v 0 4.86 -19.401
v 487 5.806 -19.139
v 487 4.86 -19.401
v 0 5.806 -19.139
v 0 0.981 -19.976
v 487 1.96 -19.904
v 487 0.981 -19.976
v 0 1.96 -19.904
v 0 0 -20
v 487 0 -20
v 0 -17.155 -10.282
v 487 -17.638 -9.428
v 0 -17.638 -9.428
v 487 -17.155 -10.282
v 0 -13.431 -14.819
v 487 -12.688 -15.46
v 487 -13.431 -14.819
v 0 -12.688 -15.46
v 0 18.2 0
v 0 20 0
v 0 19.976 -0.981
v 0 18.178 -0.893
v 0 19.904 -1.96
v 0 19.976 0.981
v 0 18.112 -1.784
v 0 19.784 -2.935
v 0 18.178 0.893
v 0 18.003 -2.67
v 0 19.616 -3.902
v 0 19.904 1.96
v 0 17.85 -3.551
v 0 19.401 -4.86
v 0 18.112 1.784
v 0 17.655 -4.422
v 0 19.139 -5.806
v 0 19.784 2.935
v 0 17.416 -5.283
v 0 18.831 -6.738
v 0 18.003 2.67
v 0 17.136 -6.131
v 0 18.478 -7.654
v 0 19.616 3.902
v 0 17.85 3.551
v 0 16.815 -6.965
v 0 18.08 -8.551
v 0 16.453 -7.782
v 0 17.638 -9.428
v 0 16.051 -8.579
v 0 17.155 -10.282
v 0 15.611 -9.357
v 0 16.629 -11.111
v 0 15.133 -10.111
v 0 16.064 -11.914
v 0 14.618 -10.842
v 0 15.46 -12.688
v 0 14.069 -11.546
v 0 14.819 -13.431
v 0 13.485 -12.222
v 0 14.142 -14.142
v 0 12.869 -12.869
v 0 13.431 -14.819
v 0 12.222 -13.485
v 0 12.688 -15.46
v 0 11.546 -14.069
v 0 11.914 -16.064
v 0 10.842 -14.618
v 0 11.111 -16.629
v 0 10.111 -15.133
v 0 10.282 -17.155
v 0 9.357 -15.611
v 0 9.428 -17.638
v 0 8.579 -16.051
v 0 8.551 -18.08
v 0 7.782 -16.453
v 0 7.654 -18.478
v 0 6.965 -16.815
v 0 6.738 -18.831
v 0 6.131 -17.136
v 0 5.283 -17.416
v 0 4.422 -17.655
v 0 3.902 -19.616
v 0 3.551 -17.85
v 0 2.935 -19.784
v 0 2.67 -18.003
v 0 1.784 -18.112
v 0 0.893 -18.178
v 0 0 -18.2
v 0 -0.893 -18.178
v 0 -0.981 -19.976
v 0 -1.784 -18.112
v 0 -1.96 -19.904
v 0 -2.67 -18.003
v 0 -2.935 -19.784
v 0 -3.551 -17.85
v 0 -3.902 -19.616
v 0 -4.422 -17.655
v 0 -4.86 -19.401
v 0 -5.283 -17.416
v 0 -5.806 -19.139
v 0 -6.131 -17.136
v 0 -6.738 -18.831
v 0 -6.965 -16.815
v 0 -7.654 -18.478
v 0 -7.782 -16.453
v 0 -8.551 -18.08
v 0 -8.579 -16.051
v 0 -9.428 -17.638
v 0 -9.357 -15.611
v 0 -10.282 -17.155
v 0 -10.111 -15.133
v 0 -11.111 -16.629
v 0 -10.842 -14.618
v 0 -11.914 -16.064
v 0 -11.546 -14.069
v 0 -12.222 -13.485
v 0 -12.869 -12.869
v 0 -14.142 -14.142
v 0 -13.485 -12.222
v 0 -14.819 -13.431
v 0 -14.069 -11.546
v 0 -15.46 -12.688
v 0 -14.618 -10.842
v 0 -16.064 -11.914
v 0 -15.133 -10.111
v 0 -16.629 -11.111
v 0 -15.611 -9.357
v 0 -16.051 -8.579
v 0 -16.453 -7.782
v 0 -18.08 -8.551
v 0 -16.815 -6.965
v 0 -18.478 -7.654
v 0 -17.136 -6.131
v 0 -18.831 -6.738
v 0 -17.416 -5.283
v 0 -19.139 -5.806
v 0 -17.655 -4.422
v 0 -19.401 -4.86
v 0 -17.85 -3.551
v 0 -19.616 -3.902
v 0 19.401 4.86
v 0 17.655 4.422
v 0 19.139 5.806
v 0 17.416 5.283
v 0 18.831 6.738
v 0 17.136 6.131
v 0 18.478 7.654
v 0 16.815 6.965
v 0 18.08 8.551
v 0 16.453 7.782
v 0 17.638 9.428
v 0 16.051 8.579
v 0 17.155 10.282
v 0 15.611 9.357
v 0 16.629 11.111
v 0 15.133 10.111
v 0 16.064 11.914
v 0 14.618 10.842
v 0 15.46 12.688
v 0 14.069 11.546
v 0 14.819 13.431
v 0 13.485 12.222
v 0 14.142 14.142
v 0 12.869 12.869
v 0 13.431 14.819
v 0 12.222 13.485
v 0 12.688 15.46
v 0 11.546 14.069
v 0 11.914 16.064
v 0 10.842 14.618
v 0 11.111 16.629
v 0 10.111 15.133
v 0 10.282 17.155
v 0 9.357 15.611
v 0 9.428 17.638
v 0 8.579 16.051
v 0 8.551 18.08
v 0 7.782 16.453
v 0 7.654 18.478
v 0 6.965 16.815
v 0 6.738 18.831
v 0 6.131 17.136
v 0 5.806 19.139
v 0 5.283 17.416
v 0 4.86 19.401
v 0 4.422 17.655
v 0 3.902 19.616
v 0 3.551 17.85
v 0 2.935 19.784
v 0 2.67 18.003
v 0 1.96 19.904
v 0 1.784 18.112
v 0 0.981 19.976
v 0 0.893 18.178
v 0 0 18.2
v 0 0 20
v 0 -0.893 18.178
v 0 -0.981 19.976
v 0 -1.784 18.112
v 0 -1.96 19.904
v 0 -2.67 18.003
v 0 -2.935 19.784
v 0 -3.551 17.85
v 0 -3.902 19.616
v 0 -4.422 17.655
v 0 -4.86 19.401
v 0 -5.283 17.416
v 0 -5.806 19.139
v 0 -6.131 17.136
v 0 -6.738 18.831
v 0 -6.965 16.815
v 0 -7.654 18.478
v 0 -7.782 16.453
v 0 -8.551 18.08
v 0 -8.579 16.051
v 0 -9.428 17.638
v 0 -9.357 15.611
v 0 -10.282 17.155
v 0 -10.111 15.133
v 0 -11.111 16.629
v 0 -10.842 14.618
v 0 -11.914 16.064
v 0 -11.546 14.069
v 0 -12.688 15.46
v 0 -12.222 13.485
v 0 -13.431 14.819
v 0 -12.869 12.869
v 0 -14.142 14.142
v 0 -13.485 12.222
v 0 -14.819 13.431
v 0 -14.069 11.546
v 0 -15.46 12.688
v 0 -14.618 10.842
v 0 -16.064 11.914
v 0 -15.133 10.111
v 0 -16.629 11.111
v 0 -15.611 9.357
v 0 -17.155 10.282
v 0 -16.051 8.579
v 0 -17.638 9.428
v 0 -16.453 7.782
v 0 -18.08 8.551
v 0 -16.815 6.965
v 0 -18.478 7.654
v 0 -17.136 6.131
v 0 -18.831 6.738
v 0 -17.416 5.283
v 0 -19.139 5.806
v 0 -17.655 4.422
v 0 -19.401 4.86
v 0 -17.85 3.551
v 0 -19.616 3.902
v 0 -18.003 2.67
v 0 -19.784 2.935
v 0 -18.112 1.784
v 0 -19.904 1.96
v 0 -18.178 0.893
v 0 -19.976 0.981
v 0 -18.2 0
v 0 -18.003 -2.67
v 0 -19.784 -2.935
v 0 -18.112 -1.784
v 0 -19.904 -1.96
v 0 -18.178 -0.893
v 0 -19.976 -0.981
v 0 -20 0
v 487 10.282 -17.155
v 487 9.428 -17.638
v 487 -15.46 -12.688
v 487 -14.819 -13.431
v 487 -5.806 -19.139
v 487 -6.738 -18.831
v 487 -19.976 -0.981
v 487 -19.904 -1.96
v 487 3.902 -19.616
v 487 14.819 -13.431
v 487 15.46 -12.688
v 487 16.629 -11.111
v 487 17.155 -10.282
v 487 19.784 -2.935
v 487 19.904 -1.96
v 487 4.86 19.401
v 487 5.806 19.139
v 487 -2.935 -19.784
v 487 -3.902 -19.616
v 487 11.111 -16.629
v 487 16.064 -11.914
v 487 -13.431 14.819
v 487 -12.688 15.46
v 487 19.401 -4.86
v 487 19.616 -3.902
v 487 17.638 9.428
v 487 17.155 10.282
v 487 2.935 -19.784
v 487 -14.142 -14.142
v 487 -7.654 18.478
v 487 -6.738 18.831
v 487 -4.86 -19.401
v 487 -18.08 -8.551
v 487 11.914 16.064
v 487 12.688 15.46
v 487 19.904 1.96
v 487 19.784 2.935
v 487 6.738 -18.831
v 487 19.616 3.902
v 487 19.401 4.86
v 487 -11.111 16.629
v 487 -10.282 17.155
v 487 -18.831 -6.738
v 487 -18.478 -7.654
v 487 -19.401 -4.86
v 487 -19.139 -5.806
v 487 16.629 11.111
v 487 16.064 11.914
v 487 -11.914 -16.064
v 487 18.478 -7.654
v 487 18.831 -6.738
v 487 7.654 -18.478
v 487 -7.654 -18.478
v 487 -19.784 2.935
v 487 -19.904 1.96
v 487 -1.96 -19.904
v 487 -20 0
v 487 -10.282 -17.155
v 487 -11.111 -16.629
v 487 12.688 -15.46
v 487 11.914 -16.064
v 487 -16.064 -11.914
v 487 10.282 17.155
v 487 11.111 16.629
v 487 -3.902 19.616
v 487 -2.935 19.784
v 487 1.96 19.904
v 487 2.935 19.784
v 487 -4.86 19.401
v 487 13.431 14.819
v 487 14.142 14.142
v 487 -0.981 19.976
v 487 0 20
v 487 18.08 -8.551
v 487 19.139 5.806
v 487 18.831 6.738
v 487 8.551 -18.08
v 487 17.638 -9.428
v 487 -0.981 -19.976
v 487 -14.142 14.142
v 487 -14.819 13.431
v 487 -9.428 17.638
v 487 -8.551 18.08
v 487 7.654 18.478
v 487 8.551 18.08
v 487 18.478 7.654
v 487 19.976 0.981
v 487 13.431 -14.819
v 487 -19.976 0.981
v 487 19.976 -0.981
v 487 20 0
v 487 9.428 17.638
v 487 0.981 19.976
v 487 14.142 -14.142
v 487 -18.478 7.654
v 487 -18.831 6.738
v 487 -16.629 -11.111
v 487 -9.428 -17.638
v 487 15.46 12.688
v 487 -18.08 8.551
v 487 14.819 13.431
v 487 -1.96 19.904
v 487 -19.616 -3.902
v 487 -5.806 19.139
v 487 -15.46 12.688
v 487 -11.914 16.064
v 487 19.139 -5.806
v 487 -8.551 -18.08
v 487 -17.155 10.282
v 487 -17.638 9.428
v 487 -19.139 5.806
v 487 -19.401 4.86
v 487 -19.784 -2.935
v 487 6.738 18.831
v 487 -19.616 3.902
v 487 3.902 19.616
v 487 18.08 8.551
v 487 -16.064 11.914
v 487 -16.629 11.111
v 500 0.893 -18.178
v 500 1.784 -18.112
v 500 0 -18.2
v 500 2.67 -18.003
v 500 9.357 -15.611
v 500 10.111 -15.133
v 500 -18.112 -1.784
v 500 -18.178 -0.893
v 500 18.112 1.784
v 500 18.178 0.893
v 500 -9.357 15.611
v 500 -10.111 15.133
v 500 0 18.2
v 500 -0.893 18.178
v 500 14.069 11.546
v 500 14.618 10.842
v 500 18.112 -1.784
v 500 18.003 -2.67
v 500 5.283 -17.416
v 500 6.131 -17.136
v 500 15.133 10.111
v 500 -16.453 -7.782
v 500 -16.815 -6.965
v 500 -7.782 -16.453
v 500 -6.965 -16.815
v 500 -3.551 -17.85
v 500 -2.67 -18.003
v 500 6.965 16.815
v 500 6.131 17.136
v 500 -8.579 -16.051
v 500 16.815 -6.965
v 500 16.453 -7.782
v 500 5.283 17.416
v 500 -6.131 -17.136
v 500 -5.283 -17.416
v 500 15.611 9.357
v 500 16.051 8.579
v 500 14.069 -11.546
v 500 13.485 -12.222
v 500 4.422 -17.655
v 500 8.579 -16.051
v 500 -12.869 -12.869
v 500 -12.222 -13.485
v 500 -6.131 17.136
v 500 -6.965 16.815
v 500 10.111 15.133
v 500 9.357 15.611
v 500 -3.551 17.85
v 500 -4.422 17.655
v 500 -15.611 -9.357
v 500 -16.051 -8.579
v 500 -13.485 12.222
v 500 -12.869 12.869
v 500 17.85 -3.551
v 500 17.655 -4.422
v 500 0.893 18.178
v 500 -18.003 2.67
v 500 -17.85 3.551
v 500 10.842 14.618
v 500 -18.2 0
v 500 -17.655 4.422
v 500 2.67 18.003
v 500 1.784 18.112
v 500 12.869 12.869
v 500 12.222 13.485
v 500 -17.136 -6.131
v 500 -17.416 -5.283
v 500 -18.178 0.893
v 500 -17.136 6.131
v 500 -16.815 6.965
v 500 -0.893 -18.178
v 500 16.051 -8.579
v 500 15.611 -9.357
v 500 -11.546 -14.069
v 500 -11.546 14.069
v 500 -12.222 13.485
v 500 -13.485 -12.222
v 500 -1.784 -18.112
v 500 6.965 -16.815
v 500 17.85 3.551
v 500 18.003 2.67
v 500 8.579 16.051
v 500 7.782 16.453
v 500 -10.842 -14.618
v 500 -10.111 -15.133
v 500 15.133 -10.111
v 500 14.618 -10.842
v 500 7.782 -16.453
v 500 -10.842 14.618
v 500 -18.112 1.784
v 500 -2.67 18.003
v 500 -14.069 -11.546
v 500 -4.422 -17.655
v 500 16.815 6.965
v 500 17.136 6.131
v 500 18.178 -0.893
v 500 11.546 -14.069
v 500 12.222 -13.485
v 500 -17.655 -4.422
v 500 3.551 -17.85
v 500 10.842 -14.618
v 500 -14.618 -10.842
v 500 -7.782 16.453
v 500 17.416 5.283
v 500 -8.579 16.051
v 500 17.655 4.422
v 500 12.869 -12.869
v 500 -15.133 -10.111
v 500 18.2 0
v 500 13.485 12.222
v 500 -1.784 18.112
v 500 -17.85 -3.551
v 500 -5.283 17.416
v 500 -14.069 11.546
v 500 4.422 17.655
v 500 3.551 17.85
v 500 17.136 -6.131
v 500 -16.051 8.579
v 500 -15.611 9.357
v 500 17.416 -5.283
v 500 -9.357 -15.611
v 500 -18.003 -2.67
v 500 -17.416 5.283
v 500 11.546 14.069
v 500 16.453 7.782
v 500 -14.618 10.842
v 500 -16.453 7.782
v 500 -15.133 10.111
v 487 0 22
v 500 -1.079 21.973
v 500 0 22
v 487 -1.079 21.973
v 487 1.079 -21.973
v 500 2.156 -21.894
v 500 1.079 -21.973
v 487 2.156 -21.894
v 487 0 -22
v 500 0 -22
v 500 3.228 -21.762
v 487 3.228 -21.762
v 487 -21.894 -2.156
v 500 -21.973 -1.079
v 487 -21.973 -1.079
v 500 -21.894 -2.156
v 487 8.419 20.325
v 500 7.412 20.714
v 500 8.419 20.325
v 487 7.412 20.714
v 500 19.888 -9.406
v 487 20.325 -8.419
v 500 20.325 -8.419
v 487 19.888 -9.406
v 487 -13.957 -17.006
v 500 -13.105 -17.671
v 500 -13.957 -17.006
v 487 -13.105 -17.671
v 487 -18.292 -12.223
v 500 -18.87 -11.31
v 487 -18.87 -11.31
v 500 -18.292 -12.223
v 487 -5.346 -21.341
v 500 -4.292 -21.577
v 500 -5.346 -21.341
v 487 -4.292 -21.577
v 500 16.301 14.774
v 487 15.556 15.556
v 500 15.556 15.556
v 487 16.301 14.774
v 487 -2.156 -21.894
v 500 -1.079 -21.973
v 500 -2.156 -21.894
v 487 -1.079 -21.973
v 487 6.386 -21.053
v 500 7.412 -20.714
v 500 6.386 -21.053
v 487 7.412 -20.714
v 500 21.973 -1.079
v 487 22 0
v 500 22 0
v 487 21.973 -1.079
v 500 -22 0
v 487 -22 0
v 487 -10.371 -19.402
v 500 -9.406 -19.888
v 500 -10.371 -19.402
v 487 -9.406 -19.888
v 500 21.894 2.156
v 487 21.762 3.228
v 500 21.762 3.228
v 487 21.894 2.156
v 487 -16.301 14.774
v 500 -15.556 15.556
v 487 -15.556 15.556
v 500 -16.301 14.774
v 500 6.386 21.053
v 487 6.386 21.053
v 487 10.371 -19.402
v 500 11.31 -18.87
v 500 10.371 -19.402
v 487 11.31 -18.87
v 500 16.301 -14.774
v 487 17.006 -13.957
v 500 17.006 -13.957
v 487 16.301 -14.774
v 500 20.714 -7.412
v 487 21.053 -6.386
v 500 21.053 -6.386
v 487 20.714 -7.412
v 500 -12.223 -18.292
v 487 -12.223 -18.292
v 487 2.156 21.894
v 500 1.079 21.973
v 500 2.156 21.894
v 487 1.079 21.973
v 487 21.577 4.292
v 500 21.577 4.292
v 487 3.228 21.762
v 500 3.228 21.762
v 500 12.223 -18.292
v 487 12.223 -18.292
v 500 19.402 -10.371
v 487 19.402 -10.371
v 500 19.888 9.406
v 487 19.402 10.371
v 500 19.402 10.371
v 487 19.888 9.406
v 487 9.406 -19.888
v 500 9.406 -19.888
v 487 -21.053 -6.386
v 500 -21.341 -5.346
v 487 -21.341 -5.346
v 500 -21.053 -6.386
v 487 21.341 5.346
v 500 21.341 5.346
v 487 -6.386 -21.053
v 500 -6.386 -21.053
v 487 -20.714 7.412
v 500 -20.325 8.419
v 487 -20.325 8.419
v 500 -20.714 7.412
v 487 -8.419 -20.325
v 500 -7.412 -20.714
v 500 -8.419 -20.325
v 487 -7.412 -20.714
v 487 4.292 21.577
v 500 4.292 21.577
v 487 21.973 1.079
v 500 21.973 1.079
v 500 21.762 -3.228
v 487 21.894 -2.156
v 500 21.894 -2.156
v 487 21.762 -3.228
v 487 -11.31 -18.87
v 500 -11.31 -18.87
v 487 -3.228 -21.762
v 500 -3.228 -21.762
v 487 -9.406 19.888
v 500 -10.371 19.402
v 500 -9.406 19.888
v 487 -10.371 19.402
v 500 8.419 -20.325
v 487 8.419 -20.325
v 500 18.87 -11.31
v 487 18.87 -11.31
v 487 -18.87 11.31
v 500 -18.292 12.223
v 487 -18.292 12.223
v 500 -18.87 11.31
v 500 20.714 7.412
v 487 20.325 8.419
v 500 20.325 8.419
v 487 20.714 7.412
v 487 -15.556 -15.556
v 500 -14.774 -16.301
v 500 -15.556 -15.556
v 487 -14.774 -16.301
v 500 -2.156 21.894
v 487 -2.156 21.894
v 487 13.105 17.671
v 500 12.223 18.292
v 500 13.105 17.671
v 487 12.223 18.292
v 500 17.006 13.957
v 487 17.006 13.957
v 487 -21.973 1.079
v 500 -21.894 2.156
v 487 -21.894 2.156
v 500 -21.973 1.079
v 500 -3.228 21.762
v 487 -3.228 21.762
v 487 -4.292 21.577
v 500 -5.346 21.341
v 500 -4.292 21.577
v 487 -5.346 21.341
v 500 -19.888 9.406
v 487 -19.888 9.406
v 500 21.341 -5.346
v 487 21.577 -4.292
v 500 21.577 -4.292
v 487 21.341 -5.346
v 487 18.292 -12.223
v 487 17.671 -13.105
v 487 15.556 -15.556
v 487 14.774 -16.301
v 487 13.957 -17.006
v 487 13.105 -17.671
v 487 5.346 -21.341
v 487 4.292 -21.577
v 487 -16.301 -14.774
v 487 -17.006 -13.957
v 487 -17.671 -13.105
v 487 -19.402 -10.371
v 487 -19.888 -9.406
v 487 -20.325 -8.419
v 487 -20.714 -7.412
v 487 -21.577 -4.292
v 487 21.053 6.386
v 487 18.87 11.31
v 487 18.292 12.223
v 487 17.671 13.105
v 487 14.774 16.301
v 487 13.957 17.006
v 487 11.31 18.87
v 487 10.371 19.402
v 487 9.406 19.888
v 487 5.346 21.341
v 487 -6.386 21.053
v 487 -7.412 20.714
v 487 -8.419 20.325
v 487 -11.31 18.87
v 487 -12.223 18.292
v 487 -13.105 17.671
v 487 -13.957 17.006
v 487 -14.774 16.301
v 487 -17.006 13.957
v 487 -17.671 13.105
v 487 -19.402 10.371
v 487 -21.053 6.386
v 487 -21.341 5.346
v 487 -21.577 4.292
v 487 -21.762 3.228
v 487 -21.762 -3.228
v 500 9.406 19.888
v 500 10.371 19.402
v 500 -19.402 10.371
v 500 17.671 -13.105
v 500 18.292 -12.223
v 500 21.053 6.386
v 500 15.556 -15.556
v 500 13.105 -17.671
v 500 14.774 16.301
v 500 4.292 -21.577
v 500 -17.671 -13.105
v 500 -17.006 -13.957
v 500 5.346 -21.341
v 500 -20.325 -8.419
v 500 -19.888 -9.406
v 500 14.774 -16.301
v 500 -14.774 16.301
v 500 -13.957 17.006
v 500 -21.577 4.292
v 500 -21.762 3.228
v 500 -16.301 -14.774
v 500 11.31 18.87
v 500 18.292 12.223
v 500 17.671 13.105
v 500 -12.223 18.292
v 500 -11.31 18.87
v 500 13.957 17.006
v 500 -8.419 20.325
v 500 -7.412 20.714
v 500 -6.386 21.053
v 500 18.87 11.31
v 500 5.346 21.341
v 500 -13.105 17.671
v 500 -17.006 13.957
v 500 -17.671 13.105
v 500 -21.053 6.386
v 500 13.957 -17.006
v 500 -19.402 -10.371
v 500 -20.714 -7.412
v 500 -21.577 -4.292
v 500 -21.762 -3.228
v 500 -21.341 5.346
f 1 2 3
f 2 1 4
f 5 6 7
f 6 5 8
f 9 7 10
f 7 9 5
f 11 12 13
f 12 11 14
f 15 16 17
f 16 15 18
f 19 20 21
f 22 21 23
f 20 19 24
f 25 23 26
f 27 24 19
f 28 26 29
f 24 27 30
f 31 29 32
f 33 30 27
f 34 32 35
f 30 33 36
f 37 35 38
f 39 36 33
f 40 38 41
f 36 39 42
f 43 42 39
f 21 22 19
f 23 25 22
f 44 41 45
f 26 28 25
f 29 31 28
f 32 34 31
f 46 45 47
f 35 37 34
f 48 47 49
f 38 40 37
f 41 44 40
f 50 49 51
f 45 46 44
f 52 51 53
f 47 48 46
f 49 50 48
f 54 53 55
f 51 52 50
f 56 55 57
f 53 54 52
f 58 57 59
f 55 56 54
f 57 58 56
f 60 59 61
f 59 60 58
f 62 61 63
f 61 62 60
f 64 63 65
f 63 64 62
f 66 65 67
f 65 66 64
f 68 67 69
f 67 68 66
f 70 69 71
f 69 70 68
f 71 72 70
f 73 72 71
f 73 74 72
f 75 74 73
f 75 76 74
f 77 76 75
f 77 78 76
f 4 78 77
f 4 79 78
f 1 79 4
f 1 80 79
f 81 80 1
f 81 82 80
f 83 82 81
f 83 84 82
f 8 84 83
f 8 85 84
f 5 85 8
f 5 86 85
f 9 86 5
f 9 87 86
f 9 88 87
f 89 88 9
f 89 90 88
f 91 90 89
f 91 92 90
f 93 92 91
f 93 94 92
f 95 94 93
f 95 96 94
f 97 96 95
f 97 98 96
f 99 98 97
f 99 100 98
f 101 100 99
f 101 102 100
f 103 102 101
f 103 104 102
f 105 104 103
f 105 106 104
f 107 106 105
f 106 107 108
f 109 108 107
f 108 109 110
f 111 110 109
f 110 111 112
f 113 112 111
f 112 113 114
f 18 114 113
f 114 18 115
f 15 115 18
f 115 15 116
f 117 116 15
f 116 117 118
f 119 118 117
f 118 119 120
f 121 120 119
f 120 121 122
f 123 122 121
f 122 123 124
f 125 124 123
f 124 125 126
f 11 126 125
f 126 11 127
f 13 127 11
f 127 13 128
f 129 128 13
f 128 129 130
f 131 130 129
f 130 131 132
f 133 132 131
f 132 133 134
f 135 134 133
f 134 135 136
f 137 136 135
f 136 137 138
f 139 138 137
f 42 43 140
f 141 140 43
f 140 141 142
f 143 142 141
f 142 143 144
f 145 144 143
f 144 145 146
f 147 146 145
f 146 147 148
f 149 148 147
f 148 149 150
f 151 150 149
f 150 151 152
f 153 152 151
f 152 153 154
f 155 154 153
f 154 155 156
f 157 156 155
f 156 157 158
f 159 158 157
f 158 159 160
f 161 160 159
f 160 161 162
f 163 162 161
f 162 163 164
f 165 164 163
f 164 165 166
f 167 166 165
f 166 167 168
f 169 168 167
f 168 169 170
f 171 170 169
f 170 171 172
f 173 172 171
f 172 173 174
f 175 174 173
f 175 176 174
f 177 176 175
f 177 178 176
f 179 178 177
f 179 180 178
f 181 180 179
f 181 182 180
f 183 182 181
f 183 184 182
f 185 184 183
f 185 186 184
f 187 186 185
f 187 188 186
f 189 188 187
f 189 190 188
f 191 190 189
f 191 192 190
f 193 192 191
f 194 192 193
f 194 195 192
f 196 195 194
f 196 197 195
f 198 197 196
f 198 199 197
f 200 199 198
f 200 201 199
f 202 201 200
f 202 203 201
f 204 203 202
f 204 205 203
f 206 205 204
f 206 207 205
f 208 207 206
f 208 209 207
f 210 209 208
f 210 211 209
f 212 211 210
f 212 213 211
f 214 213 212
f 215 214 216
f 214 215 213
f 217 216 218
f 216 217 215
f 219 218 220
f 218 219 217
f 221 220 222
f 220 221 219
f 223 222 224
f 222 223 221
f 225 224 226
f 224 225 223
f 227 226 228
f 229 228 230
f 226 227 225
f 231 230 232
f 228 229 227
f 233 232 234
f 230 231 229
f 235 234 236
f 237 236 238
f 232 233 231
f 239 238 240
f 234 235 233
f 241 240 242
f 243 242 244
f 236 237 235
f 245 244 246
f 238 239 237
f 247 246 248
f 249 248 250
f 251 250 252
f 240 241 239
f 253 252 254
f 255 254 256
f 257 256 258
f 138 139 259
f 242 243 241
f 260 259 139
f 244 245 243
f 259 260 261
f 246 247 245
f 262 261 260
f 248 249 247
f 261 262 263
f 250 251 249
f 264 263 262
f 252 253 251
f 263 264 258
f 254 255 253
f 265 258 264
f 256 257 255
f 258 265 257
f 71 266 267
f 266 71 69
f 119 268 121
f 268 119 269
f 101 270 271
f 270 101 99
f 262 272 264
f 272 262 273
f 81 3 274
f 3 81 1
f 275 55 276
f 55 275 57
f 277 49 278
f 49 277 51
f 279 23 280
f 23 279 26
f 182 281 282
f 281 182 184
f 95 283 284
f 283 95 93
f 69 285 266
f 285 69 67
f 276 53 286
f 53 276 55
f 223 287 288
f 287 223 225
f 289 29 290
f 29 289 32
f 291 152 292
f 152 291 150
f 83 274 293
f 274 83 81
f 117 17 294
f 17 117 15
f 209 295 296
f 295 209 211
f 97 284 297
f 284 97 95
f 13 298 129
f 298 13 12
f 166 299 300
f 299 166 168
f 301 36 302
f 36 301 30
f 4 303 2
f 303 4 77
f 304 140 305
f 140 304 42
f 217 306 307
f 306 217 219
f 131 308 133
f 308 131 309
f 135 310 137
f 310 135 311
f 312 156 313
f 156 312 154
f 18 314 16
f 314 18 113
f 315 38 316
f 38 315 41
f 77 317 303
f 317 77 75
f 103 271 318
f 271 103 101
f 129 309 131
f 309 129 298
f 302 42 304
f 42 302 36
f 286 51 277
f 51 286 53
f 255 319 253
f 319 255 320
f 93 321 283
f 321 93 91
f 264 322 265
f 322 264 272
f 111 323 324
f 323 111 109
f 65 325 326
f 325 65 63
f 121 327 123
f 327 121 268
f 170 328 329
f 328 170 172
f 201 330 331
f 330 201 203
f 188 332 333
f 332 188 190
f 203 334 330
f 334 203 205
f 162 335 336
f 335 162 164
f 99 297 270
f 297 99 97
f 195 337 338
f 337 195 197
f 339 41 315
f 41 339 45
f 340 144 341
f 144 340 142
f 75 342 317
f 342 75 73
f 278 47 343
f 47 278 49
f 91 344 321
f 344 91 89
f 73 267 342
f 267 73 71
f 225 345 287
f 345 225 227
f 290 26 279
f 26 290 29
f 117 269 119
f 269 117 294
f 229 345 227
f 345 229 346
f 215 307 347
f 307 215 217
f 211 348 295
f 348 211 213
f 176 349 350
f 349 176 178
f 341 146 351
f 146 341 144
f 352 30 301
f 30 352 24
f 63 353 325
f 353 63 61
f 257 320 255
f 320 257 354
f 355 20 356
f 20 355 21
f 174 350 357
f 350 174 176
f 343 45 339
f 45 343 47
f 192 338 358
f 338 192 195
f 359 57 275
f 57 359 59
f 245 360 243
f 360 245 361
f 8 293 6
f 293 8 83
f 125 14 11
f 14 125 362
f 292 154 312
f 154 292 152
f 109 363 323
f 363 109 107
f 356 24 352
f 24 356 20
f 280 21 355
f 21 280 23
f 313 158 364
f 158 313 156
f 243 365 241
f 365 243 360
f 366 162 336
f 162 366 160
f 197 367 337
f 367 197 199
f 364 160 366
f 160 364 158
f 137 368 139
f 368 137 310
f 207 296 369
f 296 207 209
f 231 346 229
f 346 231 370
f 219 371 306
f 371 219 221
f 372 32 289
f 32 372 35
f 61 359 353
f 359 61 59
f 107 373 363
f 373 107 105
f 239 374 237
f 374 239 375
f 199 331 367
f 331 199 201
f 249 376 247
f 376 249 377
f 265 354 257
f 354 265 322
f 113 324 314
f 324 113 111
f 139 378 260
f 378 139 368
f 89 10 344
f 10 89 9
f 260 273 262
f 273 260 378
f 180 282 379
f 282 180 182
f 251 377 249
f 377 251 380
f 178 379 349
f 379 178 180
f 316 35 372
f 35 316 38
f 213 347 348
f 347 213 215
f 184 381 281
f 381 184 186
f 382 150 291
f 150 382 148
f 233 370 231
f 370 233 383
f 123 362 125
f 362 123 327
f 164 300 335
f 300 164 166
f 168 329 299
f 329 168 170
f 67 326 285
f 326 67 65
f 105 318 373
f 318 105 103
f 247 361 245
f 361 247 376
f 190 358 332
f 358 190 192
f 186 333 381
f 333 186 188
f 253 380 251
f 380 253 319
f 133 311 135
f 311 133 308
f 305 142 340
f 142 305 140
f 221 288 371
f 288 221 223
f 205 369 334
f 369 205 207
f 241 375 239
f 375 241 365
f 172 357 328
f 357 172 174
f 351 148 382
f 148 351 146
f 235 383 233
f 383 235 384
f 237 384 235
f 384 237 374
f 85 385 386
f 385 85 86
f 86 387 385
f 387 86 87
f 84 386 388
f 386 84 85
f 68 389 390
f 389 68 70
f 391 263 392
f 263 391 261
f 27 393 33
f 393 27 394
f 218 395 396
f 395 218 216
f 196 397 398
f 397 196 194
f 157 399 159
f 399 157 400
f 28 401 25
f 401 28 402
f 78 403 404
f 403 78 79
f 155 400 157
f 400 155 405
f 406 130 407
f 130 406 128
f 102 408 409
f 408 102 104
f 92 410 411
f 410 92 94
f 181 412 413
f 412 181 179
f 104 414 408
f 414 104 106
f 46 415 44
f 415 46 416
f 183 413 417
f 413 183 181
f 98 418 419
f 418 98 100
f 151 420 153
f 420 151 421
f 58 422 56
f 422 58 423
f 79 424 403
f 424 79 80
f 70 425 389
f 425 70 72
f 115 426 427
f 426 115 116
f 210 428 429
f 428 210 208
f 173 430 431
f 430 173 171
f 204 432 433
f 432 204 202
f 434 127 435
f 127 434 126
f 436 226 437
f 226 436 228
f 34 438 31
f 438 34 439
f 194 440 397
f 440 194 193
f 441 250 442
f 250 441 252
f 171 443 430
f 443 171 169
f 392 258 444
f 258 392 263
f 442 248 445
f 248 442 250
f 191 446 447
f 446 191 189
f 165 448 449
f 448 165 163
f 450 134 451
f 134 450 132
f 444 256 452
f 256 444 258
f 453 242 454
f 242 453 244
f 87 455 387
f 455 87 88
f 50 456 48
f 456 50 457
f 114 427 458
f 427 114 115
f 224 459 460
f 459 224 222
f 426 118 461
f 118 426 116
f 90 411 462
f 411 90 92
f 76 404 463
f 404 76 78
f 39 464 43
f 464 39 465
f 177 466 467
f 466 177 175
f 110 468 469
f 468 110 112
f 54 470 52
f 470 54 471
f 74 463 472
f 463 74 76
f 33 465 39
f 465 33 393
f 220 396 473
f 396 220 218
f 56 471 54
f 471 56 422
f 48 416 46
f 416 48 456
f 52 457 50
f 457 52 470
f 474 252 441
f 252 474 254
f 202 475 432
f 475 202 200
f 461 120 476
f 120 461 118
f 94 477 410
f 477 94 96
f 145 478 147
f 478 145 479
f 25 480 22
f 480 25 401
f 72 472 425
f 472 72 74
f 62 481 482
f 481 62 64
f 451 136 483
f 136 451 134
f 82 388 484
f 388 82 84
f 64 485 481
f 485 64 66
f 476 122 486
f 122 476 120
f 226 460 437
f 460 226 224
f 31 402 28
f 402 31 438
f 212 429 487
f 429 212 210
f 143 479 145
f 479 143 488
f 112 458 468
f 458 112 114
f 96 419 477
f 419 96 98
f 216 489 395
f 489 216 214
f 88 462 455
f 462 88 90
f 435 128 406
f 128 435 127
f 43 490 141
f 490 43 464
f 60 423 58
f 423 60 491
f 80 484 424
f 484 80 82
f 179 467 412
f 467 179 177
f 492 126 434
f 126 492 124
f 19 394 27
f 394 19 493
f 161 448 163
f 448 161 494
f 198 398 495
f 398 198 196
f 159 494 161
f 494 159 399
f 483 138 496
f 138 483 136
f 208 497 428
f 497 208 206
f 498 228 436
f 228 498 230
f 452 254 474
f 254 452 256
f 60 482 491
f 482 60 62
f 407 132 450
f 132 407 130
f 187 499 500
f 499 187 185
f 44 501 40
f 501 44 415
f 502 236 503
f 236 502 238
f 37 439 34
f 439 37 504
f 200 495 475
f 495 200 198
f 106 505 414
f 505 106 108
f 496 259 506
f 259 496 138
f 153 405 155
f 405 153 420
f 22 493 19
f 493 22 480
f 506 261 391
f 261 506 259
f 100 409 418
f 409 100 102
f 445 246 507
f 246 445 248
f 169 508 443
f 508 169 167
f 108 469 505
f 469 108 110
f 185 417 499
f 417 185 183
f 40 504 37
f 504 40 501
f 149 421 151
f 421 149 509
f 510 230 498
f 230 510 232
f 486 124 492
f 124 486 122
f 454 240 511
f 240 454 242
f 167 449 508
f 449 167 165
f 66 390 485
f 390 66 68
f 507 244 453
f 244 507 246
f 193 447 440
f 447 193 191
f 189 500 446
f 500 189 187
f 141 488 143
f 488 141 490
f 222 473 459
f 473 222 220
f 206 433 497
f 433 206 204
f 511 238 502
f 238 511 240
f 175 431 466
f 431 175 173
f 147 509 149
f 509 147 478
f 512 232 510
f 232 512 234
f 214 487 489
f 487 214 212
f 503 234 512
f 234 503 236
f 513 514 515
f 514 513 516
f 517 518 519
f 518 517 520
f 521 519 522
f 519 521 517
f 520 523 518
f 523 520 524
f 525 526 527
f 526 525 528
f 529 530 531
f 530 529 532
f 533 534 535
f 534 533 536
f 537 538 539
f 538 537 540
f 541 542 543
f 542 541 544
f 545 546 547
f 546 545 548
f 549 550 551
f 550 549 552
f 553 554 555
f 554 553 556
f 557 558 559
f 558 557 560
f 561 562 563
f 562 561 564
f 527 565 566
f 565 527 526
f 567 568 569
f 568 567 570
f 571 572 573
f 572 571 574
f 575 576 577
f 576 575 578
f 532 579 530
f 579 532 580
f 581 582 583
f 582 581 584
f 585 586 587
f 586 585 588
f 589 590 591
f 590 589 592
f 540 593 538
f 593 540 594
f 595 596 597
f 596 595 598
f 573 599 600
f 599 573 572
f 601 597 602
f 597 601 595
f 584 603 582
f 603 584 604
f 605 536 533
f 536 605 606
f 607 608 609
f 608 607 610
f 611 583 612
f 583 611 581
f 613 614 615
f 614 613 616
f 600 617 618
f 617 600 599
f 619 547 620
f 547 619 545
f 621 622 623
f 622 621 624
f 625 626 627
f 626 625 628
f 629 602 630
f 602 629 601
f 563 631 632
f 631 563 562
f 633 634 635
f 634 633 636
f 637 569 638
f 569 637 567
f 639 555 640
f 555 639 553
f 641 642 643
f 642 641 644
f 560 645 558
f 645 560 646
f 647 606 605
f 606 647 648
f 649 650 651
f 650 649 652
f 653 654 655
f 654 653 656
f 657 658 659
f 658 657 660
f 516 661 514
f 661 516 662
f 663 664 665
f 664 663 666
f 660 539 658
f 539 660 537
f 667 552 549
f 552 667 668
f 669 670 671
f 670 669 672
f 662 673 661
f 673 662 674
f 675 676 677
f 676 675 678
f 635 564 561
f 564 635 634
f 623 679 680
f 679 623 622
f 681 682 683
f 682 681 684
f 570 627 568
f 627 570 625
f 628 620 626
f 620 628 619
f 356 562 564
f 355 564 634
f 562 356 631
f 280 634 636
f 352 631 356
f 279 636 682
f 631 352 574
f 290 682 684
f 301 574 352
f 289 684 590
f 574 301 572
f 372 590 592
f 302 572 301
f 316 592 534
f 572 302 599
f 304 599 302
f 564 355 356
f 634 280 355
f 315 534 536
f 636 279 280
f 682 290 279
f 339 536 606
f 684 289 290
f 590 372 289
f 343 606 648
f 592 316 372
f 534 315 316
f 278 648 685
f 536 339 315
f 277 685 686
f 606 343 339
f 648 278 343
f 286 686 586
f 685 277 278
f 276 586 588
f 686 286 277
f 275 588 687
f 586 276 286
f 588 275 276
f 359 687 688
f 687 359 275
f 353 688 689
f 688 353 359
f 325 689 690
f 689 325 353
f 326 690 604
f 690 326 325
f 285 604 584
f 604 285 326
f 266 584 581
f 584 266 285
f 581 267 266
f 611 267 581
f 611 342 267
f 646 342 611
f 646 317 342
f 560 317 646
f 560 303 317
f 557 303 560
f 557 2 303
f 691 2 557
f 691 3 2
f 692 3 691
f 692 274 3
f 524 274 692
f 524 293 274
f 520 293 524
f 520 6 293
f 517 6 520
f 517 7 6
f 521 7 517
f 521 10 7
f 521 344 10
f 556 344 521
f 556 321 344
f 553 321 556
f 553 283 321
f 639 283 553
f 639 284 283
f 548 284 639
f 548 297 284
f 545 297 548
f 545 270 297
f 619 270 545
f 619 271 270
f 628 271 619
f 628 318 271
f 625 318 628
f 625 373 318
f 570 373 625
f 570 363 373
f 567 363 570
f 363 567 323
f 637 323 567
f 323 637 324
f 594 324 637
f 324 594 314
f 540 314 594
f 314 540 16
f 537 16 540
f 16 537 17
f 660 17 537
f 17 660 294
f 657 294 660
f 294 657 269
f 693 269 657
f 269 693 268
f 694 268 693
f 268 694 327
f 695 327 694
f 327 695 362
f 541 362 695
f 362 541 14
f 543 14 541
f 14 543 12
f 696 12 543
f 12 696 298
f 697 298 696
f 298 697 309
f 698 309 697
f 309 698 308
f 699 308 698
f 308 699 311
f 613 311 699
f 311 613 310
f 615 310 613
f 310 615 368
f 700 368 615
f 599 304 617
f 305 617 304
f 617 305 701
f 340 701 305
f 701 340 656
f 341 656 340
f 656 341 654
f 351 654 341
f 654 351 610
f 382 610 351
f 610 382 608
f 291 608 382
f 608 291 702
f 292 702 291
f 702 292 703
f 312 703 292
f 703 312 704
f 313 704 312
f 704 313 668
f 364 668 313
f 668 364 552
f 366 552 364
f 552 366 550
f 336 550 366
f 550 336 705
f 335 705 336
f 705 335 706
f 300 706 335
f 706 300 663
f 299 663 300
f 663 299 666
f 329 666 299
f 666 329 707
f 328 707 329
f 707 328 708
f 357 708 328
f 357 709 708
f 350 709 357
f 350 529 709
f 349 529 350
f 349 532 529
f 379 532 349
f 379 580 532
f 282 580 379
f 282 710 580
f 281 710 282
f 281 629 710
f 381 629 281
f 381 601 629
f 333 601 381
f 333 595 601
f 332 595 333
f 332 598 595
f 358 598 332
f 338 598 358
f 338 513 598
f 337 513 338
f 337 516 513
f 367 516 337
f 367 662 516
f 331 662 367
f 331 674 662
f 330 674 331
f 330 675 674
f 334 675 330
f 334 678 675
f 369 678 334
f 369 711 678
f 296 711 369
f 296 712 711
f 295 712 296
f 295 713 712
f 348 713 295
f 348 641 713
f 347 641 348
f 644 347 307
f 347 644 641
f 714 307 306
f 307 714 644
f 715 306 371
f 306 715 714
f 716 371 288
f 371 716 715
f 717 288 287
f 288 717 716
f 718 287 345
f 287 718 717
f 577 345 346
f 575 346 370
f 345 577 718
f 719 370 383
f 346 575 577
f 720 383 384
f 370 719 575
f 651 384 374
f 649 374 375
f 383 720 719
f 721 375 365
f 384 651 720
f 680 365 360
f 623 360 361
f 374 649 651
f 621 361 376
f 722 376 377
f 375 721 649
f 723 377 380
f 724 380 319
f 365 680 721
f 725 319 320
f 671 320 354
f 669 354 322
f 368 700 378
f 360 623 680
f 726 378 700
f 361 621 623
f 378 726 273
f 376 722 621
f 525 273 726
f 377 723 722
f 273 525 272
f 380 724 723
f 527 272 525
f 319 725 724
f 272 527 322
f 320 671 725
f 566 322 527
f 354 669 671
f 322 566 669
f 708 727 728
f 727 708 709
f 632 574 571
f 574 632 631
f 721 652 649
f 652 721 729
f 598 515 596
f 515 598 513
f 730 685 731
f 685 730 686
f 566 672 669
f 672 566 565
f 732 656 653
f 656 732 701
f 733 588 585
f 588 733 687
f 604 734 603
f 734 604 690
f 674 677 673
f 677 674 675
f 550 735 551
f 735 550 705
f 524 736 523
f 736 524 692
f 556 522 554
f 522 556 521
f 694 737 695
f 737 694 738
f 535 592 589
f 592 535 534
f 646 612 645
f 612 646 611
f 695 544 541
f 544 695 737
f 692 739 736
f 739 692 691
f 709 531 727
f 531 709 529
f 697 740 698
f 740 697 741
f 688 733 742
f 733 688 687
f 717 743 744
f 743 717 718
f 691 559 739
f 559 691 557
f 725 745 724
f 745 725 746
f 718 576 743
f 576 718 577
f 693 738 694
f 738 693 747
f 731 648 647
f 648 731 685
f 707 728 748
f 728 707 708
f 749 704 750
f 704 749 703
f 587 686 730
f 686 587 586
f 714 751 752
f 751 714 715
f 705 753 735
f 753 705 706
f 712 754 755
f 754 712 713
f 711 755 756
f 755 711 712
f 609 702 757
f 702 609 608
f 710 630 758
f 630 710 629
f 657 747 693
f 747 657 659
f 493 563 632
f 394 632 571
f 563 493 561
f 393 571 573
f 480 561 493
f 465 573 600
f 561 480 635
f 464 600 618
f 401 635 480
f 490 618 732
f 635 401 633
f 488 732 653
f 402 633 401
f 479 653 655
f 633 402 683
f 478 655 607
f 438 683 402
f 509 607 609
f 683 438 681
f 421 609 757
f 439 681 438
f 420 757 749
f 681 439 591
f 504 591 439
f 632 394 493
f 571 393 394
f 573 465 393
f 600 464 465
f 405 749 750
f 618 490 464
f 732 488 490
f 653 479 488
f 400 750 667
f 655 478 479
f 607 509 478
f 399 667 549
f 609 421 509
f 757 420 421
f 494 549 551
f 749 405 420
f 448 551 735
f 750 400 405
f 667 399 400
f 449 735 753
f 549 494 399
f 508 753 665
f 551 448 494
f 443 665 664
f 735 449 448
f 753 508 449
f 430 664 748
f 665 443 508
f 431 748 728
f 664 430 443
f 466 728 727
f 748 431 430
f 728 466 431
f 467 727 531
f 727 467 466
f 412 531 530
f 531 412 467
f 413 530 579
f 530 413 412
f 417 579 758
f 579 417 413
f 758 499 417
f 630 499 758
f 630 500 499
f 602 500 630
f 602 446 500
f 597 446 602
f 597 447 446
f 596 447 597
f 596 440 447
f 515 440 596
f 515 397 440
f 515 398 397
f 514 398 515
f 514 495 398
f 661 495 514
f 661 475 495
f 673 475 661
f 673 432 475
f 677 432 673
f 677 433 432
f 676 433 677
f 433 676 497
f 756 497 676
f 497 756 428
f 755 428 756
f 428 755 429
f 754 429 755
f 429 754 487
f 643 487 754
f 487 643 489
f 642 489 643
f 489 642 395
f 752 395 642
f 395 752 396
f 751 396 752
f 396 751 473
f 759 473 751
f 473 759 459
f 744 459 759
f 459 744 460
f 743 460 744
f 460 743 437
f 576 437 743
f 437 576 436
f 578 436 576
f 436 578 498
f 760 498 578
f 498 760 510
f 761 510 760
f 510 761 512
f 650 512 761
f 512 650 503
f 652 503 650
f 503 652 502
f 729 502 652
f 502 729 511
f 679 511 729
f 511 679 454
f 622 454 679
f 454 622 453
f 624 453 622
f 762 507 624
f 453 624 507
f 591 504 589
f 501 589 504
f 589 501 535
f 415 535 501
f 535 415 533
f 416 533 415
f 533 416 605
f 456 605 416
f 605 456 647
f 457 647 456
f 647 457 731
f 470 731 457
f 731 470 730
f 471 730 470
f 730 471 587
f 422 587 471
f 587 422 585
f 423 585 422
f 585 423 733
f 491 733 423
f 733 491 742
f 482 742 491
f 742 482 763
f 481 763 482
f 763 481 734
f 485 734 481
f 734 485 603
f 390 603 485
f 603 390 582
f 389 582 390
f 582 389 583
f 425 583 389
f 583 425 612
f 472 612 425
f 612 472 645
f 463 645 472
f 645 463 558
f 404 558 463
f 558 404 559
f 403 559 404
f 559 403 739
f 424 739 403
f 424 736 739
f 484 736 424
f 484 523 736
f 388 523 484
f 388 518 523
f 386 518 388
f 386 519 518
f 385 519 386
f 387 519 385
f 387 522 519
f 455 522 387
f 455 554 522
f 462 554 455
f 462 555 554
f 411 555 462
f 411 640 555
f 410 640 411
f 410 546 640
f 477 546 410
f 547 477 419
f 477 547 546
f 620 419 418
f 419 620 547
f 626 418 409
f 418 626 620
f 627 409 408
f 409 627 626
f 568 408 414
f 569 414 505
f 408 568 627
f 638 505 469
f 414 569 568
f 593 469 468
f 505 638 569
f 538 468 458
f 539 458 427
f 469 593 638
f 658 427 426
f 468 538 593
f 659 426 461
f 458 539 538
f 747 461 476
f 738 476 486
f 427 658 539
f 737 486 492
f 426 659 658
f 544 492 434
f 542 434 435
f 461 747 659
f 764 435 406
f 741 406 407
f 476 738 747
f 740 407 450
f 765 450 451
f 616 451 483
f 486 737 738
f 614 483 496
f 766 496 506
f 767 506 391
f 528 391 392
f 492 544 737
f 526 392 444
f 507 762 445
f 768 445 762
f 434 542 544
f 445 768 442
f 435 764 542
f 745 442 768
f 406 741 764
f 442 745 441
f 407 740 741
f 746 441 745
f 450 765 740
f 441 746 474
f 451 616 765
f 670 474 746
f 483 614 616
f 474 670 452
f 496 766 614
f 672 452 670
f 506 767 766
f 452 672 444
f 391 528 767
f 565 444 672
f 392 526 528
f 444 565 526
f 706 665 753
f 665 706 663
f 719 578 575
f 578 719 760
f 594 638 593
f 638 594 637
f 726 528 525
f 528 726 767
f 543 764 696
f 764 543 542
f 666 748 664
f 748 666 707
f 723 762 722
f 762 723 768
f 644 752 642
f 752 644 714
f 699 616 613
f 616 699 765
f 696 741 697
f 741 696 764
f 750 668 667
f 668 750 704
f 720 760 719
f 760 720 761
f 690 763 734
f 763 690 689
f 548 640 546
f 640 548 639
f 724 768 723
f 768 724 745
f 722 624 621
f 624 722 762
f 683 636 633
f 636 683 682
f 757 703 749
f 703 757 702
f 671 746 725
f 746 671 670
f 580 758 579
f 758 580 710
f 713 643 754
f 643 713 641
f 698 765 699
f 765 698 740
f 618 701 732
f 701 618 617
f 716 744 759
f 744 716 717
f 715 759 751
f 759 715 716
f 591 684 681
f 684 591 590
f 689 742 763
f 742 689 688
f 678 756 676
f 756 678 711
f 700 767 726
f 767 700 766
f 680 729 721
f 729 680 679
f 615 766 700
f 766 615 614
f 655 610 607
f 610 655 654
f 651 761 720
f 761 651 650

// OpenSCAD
// Parameters
length_mm = 500; //[250:1000:1]
ht40_outer_diameter = 40; //[30:80:0.5]
ht40_wall_thickness = 1.8; //[0.9:3.6:0.1]
end_fitting_length = 12; //[6:24:0.5]
end_fitting_radial_add = 2; //[1:6:0.5]
overlap_mm = 1; //[0.5:2:0.1]
center = 0; //[0:1:1]

$fn = 128;

// HT Pipe - complete geometry
module ht_pipe() {
  outer_r = ht40_outer_diameter/2;
  inner_r = outer_r - ht40_wall_thickness;

  // Keep fitting within total length so overall length stays exactly length_mm
  fit_len = min(end_fitting_length, length_mm);
  pipe_len = length_mm - fit_len;

  // Place pipe along X so front/back/left/right orthographic views show the 500mm length
  // (OpenSCAD default: X=right, Y=back, Z=up; Front view looks along -Y)
  rotate([0, 90, 0]) {
    translate([0, 0, center ? -length_mm/2 : 0]) {
      color([0.85, 0.85, 0.8]) {
        union() {
          // Main pipe section (hollow)
          difference() {
            cylinder(h=pipe_len, r=outer_r, center=false);
            translate([0, 0, -overlap_mm])
              cylinder(h=pipe_len + 2*overlap_mm, r=inner_r, center=false);
          }

          // End fitting (outer sleeve), connected with overlap
          translate([0, 0, pipe_len - overlap_mm]) {
            difference() {
              cylinder(h=fit_len + overlap_mm, r=outer_r + end_fitting_radial_add, center=false);
              translate([0, 0, -overlap_mm])
                cylinder(h=fit_len + 2*overlap_mm, r=inner_r, center=false);
            }
          }
        }
      }
    }
  }
}

// Assembly
module assembly() {
  ht_pipe();
}

assembly();
